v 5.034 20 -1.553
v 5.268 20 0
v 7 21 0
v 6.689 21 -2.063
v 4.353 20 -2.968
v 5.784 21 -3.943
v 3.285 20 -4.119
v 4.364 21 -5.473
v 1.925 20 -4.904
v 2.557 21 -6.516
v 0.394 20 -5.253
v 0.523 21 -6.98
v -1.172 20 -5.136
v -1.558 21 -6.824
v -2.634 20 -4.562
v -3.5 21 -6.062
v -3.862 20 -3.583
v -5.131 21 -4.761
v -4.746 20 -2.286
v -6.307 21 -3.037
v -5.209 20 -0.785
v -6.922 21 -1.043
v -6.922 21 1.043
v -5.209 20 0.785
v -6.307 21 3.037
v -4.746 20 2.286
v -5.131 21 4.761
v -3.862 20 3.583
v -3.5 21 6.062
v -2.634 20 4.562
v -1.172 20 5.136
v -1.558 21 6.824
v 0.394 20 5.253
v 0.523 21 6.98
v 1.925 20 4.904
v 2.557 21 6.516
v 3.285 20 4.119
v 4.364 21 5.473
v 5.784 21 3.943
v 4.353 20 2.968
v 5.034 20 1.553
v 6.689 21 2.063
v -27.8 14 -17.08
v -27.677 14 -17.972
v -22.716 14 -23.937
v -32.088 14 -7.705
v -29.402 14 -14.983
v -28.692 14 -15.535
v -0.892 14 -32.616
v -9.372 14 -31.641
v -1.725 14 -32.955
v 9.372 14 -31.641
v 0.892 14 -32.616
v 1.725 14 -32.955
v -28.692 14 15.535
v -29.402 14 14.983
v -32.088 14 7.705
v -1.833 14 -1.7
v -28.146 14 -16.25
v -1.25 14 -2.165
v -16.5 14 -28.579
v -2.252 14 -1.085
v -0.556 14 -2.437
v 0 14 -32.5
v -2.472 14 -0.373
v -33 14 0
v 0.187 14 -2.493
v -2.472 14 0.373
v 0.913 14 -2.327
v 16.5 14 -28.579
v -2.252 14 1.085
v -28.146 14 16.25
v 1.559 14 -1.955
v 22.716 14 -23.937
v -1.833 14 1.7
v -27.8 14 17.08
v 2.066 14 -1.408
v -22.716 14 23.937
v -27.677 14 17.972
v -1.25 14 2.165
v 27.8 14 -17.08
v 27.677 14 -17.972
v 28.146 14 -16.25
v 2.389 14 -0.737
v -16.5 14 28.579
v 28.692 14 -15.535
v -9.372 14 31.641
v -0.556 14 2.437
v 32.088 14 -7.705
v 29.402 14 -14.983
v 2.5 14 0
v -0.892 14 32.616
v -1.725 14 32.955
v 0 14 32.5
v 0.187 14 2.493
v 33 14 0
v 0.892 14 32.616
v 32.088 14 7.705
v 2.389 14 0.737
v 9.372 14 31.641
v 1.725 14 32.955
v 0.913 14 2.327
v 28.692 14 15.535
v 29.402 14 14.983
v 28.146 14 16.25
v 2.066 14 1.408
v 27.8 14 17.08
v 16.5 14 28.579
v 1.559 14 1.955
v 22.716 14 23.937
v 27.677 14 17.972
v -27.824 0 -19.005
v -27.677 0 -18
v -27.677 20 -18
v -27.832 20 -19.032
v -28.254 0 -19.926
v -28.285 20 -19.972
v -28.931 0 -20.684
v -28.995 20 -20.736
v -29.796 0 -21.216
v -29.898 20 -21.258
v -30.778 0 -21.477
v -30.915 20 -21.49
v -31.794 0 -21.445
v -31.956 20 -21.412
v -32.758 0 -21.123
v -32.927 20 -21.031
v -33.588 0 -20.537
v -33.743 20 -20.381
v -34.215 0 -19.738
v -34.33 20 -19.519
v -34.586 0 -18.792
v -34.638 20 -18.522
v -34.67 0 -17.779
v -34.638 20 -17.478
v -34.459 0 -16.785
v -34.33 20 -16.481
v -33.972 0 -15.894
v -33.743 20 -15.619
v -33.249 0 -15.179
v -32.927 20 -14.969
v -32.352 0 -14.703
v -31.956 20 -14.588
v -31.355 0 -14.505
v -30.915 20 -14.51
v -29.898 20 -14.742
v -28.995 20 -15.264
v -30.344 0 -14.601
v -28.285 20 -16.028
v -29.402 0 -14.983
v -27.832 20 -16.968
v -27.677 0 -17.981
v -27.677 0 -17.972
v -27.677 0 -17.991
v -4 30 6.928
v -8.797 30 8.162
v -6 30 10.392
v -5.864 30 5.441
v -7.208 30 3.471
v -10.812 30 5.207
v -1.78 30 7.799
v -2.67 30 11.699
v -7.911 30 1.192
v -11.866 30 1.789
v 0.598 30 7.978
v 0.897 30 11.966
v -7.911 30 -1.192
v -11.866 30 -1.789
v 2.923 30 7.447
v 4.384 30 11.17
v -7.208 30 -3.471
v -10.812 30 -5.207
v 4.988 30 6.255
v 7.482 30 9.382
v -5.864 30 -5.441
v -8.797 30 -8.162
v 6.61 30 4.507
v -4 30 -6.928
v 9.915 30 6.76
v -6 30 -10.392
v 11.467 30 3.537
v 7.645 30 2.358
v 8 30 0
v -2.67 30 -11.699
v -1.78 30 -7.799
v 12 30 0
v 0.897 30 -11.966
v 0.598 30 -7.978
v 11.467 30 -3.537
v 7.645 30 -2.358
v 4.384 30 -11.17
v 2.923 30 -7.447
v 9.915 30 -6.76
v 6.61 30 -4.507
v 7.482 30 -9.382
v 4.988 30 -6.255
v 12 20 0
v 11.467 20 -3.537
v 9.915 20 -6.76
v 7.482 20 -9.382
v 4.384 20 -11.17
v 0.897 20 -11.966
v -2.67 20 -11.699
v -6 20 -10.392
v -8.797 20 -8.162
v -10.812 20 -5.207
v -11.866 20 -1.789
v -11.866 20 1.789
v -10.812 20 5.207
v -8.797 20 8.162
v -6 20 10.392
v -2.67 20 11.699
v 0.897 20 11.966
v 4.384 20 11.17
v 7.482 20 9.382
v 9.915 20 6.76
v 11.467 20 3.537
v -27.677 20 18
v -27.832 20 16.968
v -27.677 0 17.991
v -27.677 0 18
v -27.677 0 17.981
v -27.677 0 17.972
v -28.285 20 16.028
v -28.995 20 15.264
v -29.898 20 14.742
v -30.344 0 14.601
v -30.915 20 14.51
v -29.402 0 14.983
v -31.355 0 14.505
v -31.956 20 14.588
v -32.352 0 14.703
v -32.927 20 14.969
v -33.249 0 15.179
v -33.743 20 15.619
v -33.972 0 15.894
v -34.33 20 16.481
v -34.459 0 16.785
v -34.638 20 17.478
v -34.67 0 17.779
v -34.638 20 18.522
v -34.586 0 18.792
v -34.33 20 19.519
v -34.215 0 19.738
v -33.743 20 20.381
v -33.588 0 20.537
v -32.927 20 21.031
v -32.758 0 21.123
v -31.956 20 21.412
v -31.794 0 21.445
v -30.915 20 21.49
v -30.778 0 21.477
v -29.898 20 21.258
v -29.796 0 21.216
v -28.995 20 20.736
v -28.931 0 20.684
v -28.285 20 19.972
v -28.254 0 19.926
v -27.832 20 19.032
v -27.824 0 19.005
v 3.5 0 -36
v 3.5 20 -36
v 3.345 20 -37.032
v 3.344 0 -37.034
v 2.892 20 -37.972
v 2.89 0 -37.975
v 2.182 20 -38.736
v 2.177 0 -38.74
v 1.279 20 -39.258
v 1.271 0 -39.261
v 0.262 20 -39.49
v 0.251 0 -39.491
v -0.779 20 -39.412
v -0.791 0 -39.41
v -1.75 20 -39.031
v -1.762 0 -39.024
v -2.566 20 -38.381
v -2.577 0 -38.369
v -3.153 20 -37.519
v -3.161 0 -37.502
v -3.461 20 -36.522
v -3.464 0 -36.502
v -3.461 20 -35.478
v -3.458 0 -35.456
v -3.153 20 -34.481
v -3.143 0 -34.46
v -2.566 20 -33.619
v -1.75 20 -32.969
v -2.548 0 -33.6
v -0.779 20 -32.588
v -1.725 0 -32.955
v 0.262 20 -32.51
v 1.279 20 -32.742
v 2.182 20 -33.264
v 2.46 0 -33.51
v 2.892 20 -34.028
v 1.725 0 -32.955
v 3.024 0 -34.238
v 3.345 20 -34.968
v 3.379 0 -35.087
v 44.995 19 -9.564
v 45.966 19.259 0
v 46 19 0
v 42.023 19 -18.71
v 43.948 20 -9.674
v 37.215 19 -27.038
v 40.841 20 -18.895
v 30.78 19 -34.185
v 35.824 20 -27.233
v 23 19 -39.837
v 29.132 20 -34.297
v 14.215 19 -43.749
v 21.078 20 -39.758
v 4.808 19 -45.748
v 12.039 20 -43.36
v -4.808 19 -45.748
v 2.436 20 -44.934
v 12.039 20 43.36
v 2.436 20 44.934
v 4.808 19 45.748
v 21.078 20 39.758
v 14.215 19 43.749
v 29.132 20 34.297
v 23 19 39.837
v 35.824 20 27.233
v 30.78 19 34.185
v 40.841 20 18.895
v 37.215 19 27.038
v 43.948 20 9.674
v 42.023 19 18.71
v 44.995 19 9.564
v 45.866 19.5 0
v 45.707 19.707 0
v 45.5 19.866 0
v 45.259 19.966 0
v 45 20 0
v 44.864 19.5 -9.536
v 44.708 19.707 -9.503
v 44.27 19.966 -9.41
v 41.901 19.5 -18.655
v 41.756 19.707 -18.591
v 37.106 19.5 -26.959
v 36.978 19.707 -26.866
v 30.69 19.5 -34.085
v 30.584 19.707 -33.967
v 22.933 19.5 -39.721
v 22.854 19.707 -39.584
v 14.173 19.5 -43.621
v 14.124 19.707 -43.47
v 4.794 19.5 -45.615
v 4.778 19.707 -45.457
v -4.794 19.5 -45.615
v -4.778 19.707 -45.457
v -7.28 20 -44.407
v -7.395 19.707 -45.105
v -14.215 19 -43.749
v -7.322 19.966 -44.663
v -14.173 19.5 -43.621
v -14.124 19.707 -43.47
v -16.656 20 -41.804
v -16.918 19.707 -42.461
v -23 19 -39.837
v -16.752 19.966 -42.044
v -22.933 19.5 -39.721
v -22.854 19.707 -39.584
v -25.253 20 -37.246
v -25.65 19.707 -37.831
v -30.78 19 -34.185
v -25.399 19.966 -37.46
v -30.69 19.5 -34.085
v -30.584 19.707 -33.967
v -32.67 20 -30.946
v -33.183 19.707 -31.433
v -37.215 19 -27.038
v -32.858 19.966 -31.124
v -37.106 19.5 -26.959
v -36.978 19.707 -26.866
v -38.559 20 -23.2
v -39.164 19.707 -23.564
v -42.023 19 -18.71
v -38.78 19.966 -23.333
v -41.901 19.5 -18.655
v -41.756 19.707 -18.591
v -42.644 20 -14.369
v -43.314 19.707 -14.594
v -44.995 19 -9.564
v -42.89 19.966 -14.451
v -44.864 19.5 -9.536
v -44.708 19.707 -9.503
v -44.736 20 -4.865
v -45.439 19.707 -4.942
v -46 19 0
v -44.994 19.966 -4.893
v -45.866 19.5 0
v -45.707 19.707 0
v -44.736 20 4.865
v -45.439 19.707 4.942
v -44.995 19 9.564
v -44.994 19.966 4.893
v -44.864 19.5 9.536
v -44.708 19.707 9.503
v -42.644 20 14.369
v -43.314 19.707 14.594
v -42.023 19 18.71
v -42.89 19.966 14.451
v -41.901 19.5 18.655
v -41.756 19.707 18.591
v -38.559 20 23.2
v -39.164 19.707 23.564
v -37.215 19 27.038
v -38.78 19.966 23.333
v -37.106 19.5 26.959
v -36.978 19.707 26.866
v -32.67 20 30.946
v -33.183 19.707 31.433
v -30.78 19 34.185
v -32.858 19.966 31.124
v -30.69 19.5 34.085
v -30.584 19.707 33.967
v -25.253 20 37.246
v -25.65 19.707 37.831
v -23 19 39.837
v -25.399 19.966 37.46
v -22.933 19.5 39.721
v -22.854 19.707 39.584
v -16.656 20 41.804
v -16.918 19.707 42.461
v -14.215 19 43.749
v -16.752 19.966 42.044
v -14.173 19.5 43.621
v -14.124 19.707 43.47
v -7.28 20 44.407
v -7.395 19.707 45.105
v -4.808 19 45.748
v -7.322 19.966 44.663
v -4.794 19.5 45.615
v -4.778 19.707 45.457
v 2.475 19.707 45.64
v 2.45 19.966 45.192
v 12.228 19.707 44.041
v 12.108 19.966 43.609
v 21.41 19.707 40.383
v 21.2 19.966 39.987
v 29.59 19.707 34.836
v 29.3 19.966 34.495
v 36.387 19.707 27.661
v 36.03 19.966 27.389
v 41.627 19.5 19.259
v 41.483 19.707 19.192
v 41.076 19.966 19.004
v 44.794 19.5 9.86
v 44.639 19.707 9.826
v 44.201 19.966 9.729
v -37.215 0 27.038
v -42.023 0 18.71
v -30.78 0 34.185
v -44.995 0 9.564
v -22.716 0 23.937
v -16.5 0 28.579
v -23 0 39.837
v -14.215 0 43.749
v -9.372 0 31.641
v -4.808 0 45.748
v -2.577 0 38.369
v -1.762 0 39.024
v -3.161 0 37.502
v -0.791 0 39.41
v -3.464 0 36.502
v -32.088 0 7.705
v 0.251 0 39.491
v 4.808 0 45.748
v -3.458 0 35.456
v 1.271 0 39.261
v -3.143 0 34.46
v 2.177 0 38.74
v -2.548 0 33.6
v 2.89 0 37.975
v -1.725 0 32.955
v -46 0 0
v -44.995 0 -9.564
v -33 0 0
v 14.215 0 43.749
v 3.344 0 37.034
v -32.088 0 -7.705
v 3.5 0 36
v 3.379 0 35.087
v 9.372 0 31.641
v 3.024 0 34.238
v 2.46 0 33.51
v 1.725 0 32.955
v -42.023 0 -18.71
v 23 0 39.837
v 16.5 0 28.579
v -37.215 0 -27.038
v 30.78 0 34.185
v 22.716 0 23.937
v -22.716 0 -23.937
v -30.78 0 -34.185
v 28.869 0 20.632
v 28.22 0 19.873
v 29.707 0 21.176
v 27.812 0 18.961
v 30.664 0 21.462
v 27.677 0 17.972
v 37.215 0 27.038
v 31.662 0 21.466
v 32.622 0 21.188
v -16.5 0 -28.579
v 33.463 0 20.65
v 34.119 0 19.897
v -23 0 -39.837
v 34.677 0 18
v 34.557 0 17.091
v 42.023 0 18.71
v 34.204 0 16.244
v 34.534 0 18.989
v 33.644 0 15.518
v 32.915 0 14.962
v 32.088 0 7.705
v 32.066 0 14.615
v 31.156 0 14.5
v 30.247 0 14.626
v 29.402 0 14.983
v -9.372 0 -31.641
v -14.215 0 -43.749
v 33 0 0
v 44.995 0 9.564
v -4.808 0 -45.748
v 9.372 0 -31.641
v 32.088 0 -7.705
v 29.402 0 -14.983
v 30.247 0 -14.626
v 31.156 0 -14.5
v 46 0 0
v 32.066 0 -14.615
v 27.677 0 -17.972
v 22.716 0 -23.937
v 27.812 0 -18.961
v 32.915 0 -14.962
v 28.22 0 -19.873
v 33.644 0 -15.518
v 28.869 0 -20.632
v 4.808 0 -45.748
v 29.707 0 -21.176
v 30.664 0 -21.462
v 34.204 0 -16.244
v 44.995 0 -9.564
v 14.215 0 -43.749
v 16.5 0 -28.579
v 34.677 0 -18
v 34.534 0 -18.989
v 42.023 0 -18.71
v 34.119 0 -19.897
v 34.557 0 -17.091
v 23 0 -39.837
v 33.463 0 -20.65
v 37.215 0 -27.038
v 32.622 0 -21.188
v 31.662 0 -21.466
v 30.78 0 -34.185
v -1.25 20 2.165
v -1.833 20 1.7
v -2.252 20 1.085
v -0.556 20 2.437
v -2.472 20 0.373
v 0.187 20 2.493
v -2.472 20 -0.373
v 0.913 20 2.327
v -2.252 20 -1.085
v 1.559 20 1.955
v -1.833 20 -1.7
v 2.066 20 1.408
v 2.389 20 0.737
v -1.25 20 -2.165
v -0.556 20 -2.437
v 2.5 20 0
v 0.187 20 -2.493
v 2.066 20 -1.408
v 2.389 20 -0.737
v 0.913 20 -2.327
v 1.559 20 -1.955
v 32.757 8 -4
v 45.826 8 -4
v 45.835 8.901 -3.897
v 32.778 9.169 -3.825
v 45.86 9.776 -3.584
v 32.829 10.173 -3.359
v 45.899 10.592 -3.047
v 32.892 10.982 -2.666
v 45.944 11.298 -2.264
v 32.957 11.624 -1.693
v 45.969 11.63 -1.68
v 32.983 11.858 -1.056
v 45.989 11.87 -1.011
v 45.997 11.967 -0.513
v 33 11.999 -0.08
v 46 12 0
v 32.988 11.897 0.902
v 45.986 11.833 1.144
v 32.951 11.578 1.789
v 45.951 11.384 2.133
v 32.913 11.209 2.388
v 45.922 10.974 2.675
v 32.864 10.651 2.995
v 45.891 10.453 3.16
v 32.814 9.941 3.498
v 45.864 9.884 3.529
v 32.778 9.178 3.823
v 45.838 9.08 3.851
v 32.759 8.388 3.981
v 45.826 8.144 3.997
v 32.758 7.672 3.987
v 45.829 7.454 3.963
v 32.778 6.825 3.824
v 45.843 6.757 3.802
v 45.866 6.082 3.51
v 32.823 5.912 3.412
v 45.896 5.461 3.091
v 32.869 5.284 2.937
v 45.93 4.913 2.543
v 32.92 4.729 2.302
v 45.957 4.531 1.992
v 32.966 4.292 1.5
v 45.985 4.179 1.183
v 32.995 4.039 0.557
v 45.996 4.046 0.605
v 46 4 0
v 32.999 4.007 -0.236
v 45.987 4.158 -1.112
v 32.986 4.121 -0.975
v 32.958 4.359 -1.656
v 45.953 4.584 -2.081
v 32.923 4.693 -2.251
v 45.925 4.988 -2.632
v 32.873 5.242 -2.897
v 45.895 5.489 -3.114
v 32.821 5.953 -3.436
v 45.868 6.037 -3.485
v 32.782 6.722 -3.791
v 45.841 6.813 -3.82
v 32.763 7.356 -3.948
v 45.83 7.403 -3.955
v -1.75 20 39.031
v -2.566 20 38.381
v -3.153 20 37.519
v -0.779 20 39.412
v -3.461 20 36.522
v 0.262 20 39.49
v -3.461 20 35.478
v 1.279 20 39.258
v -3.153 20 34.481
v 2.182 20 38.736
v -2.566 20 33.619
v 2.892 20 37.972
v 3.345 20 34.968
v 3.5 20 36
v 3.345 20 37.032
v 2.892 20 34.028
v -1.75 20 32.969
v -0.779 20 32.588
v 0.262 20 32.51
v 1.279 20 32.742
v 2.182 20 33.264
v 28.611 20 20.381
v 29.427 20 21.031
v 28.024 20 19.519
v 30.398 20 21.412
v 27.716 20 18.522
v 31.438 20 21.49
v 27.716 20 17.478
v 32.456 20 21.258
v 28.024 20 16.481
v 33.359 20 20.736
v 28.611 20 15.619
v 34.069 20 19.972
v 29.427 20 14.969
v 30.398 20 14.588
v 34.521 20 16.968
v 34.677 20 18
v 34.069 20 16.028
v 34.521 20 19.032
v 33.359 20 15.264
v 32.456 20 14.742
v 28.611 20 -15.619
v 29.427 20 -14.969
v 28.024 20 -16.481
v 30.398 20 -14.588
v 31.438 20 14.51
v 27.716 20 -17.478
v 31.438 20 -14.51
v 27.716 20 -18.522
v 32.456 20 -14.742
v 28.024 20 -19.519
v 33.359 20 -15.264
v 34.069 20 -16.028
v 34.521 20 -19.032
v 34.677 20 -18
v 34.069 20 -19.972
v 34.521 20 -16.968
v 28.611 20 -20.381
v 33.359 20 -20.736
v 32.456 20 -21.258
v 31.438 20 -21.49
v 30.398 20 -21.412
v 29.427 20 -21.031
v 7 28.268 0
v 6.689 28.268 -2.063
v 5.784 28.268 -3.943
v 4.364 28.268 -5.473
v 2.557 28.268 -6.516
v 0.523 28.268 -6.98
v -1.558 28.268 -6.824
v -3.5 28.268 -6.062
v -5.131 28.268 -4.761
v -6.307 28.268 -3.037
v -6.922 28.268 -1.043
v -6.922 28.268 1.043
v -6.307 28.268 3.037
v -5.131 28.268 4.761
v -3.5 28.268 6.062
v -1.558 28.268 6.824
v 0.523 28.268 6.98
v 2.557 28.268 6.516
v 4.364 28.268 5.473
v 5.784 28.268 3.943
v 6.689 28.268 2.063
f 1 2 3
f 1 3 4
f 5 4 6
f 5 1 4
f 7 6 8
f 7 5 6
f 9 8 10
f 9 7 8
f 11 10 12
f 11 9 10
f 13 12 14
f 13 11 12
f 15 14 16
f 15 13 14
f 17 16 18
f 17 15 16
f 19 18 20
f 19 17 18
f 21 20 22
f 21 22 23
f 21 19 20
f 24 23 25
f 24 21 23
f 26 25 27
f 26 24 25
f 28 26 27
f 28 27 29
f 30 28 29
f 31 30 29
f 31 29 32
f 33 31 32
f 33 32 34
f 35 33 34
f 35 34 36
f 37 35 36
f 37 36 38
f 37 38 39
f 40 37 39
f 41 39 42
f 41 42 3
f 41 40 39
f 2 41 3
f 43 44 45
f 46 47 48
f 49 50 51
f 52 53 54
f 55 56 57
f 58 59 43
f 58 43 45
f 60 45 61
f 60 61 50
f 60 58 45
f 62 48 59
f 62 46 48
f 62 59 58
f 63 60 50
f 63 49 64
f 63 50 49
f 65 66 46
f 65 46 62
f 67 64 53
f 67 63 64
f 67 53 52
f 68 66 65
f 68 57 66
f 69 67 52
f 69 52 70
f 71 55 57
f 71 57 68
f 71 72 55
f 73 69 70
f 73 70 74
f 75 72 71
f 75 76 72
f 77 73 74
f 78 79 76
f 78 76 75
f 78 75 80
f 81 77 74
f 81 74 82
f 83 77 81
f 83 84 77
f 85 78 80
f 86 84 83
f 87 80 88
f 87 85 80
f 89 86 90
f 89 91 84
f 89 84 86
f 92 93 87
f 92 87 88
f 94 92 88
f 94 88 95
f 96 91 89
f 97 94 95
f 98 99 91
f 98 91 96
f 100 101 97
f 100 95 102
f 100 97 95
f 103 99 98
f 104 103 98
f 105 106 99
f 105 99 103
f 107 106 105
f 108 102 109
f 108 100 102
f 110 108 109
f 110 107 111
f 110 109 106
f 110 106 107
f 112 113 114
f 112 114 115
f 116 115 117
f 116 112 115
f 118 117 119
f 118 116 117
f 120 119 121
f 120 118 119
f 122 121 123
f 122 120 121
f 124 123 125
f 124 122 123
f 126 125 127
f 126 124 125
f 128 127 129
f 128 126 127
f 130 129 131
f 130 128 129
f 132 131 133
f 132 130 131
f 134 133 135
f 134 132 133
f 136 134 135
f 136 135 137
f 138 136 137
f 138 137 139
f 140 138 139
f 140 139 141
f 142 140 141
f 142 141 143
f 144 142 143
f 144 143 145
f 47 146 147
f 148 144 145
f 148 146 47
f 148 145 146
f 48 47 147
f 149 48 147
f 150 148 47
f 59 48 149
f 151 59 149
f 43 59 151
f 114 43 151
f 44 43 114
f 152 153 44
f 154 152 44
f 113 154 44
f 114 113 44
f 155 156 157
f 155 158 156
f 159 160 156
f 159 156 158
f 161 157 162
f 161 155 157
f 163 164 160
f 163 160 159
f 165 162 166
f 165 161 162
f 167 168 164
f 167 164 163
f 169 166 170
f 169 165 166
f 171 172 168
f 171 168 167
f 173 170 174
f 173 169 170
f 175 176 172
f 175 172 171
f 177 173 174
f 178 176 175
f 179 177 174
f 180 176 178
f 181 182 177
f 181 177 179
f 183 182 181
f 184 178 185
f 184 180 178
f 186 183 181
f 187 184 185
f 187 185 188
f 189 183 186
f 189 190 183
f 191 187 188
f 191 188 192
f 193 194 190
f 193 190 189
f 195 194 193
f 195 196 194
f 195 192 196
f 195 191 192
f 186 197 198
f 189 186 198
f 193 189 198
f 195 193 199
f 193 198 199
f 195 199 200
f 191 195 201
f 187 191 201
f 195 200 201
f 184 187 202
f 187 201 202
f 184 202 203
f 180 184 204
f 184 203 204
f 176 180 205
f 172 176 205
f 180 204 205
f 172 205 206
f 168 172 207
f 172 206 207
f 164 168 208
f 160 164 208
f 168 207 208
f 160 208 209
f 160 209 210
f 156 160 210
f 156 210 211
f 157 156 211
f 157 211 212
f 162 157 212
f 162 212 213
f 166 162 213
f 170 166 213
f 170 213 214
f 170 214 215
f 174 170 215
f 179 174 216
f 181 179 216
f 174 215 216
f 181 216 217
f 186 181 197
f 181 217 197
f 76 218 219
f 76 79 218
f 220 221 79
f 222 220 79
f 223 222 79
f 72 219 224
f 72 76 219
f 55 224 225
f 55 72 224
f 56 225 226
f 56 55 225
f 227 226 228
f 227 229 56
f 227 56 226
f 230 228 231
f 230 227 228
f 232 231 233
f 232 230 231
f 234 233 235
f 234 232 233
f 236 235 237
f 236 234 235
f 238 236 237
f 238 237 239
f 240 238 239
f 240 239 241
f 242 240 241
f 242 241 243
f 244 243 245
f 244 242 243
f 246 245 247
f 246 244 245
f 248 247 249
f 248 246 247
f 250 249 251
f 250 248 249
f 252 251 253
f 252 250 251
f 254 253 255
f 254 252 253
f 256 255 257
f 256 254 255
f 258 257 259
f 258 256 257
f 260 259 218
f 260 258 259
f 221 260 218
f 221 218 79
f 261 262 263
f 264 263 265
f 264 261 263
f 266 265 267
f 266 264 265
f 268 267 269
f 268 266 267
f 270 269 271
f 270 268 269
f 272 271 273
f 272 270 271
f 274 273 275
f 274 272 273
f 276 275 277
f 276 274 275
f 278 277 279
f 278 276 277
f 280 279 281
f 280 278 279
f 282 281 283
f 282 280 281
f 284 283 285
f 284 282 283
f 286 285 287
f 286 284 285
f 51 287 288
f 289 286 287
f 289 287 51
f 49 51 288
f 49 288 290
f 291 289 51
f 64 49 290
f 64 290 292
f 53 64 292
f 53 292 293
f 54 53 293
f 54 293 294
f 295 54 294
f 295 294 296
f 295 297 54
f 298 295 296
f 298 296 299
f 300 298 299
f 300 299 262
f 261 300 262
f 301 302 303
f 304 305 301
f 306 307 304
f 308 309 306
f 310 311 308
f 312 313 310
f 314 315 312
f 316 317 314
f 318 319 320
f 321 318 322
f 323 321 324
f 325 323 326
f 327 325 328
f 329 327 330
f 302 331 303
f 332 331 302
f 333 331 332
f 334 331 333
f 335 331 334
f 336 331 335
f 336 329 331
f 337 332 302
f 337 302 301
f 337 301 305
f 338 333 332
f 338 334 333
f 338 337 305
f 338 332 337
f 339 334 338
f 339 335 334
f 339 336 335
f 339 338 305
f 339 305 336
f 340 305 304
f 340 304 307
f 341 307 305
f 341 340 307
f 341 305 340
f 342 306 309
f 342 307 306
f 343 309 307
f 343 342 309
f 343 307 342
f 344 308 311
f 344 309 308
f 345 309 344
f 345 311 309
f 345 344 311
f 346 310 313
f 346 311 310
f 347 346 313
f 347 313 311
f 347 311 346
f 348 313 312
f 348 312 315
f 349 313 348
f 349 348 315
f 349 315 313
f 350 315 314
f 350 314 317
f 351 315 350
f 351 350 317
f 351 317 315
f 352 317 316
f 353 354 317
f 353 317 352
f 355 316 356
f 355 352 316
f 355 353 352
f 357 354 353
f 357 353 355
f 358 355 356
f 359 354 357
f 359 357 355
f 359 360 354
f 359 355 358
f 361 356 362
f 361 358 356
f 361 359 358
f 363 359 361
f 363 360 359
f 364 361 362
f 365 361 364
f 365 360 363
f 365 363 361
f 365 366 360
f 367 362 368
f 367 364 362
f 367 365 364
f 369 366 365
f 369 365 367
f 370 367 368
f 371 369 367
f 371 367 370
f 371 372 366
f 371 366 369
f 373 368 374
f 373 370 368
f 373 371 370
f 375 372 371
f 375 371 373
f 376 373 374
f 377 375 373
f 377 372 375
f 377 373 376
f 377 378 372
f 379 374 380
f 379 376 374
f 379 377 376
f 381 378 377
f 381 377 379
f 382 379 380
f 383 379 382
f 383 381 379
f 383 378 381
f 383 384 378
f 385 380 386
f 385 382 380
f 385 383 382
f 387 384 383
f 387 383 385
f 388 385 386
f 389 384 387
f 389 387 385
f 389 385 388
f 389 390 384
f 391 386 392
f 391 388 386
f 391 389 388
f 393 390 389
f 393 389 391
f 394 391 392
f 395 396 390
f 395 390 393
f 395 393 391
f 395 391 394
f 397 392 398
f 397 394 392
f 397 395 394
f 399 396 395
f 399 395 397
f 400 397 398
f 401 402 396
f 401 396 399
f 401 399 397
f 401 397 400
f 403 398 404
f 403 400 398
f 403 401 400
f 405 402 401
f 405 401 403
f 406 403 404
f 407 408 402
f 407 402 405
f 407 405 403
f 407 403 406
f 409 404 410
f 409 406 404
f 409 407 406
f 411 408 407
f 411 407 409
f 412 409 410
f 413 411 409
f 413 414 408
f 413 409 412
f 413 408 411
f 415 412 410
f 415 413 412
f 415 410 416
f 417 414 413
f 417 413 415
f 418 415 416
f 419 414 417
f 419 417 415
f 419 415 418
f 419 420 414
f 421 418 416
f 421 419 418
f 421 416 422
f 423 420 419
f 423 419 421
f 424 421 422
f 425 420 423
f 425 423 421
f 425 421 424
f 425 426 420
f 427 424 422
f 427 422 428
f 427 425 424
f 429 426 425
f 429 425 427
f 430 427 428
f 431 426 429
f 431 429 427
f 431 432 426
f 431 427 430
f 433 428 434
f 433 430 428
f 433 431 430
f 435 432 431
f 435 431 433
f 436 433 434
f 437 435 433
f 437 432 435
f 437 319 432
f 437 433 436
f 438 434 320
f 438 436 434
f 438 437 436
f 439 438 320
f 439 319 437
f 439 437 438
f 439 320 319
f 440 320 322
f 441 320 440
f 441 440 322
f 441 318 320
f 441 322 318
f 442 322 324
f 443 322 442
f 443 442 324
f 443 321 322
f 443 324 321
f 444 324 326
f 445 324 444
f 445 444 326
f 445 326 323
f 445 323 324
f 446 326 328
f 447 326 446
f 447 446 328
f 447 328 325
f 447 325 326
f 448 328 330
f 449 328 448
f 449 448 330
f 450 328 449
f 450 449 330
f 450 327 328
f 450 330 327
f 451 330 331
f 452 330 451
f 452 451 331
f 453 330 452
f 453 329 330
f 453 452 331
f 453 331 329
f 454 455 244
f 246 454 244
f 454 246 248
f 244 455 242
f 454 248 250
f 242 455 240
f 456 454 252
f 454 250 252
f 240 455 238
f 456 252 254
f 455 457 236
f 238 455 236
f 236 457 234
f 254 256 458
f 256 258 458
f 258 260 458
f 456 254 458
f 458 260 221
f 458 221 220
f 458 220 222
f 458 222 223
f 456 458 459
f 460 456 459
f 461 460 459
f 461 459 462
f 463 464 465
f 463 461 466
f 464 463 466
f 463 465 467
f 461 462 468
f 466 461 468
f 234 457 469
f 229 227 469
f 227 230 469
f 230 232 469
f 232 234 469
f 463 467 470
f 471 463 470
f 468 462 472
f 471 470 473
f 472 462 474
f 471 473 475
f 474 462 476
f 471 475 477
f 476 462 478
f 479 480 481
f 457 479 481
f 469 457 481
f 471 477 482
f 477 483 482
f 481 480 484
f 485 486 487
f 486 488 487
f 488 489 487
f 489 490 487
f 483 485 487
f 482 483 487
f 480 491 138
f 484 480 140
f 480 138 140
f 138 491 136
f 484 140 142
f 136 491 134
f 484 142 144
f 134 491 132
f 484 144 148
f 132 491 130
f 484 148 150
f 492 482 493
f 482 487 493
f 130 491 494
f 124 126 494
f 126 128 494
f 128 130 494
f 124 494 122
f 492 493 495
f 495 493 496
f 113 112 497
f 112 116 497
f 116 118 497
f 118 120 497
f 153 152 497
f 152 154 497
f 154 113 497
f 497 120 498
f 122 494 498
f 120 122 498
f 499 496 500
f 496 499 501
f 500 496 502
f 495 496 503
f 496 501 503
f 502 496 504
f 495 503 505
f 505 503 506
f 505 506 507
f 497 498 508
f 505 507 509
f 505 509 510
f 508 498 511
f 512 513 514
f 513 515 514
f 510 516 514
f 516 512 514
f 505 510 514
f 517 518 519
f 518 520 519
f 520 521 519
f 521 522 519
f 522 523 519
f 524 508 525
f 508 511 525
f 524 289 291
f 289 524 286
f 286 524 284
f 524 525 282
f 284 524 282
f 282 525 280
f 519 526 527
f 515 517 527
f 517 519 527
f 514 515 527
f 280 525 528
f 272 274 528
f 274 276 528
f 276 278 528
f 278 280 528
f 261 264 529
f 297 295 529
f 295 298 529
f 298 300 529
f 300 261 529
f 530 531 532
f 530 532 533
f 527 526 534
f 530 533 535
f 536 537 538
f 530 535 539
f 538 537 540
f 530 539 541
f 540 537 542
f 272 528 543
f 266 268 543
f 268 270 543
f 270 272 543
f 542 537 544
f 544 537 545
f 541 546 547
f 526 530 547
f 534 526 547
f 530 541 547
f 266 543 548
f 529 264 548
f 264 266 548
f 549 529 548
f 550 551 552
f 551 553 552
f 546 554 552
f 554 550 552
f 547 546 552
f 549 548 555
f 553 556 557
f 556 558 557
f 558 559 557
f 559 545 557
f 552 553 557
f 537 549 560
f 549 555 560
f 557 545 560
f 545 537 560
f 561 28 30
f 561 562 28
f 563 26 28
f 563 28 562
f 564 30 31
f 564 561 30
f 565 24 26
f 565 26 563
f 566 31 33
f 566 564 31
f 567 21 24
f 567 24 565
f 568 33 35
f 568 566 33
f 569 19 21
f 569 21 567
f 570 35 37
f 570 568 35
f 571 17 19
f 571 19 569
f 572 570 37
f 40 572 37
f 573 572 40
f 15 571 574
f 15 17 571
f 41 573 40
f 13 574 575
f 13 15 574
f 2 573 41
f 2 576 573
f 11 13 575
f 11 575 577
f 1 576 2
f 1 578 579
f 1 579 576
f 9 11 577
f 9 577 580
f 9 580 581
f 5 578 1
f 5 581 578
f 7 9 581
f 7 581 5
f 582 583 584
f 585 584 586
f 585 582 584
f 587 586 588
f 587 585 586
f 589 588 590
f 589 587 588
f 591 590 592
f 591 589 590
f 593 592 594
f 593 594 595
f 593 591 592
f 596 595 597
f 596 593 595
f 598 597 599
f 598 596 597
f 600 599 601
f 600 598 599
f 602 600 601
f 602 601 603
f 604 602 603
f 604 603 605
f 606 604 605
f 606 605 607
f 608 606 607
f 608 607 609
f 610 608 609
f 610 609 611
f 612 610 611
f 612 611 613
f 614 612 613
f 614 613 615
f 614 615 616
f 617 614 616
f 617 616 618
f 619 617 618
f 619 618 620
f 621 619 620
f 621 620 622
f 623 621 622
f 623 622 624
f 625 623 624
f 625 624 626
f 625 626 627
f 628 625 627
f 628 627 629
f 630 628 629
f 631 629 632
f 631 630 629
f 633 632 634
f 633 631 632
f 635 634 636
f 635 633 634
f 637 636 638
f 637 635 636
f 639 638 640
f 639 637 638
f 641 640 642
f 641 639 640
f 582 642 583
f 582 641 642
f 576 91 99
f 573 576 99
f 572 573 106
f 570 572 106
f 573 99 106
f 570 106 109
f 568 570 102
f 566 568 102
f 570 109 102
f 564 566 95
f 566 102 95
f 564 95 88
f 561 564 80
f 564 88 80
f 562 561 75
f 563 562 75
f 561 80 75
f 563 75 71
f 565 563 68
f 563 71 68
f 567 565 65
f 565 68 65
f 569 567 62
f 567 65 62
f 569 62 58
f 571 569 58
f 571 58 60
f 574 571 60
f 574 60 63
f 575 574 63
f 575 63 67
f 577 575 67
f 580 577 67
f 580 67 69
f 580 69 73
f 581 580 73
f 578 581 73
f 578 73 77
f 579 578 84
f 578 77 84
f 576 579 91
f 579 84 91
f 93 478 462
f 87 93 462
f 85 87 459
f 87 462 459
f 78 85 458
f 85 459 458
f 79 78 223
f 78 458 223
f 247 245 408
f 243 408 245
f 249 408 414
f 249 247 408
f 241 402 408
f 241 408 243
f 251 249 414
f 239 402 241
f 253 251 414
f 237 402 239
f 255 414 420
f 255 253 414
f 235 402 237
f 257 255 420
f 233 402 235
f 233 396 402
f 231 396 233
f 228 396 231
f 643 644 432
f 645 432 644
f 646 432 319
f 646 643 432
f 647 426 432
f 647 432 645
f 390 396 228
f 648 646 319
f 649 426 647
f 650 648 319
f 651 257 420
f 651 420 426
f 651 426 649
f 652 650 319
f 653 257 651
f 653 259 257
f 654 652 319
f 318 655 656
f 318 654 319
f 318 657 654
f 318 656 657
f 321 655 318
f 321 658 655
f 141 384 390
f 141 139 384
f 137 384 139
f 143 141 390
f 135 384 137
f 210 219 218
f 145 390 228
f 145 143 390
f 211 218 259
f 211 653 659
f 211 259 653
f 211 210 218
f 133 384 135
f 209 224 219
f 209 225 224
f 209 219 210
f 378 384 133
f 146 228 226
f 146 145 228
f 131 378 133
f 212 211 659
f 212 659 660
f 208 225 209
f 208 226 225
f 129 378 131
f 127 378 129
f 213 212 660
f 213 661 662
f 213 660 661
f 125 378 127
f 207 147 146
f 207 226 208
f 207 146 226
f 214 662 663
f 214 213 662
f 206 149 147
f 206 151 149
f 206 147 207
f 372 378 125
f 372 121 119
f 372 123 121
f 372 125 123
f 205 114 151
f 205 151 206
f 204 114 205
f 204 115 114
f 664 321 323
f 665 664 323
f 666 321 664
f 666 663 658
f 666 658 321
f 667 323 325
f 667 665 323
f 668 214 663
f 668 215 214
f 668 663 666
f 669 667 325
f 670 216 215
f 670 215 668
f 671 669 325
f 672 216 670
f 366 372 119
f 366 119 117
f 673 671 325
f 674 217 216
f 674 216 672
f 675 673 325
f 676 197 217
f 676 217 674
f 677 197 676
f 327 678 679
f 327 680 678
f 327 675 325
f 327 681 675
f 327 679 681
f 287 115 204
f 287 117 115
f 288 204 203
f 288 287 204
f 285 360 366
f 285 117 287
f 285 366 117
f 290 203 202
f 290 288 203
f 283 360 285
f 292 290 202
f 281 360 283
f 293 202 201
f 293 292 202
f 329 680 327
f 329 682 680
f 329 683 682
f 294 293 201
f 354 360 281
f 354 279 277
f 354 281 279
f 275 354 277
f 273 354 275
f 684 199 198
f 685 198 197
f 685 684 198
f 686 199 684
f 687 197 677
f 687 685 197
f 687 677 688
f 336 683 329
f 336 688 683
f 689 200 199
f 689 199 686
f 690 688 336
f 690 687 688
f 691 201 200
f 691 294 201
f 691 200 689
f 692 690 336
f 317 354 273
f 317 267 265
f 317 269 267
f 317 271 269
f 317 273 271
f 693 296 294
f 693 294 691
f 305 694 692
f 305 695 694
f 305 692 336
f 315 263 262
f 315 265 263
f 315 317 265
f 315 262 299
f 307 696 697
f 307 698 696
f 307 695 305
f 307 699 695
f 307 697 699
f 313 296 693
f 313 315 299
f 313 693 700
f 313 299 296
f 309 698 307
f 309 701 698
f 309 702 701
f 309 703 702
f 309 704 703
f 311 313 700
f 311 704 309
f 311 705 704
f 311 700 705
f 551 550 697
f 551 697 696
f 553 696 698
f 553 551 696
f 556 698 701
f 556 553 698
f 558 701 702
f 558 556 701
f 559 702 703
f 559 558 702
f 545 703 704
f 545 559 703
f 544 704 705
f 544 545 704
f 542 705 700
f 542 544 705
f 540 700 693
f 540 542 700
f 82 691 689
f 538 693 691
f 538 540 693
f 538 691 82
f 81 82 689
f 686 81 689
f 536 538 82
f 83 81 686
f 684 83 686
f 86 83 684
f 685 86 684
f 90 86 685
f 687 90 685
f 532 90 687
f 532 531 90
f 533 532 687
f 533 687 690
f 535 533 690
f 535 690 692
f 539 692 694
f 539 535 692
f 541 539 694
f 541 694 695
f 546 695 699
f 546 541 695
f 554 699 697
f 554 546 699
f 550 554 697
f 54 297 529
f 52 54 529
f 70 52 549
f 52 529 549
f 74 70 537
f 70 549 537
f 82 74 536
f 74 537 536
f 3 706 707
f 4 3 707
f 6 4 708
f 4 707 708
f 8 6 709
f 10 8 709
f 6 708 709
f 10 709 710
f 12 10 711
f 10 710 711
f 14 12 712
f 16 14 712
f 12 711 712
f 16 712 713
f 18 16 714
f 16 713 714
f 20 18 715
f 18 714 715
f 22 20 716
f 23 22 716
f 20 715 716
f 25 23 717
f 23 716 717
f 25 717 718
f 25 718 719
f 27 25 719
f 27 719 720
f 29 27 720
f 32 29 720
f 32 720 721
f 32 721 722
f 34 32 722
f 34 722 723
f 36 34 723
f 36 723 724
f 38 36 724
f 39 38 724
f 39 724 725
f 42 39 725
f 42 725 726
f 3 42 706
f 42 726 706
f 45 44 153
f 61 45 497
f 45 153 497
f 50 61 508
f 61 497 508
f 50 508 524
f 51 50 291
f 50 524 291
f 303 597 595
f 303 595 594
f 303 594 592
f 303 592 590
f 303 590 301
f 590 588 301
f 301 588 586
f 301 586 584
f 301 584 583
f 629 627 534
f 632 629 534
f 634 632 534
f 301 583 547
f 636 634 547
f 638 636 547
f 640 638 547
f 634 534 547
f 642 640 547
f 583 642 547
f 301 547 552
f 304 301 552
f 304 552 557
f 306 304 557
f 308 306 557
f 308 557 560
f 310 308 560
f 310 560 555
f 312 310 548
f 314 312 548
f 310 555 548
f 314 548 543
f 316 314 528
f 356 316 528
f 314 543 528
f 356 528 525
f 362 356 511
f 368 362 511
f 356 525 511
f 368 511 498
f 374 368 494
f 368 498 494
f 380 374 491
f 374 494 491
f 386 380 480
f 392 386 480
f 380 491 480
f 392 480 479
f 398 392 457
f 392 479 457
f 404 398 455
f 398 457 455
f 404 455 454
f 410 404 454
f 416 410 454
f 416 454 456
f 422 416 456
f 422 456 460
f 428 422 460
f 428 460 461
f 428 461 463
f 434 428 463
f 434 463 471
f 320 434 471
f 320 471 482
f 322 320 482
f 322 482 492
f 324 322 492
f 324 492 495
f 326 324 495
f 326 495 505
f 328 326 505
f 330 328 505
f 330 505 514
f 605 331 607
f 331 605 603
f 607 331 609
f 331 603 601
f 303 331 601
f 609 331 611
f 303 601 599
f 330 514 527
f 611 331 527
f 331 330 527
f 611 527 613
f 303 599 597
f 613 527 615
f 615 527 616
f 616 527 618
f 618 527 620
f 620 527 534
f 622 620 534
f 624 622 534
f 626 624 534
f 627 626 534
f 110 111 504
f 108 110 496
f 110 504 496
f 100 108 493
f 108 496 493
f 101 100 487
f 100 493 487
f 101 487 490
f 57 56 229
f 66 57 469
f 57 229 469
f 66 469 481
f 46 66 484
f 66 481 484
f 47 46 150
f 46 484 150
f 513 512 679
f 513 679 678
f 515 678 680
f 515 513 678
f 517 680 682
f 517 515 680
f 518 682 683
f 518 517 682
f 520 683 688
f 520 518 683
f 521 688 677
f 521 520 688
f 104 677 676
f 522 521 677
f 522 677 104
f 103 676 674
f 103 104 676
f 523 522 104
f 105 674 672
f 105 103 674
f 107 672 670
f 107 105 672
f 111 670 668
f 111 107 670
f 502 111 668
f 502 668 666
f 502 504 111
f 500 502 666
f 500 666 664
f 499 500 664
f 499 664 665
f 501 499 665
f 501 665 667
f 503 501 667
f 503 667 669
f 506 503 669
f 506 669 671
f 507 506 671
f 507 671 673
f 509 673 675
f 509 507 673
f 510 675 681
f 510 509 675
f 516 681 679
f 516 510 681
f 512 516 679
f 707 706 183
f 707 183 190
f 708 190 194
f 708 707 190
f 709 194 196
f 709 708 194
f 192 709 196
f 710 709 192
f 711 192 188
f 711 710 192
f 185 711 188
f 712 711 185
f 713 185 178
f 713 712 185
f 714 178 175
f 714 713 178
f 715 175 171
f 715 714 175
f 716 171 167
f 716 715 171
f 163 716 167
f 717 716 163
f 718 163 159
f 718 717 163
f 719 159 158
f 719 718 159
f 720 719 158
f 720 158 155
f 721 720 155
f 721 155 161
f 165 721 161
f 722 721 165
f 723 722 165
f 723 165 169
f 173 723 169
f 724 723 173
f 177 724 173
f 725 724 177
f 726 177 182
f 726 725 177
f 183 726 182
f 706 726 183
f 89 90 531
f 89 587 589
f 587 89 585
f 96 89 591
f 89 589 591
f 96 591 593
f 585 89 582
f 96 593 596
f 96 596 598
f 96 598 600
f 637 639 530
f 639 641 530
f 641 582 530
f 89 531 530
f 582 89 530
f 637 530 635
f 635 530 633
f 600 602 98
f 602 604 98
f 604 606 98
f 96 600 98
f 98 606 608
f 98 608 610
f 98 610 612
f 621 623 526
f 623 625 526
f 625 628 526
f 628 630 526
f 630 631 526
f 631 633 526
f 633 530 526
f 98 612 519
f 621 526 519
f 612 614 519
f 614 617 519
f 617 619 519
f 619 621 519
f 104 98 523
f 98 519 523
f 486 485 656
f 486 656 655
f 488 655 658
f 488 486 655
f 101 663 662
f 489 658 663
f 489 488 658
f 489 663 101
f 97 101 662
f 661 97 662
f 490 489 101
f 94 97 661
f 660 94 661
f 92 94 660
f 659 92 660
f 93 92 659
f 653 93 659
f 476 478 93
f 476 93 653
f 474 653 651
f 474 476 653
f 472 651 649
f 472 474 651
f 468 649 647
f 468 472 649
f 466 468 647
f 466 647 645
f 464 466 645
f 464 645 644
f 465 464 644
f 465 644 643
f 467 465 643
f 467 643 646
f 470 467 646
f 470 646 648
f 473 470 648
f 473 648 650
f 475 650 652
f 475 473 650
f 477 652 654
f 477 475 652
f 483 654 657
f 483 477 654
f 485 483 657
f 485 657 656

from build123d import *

# Parameters (mm, degrees)
SKETCH3_R             = 46
SKETCH3_R_2           = 3.5
BOSS_EXTRUDE2_DEPTH   = 20
FILLET1_R             = 1
SKETCH4_R             = 12
BOSS_EXTRUDE3_DEPTH   = 10
SKETCH5_R             = 33
CUT_EXTRUDE1_DEPTH    = 14
SKETCH6_R             = 2.5
CUT_EXTRUDE2_DEPTH    = 6
SKETCH7_R             = 7
CUT_EXTRUDE3_DEPTH    = 10
CHAMFER1_SIZE         = 1
CHAMFER1_SIZE2        = 1.732050808
CHAMFER1_PART_2_SIZE  = 1
CHAMFER1_PART_2_SIZE2 = 1.732050808
SKETCH8_R             = 4
CUT_EXTRUDE4_DEPTH    = 47.0000001


with BuildPart() as part:
    # Sketch3 → Boss-Extrude2 (new body)
    with BuildSketch(Plane(origin=(0, 0, 0), x_dir=(1, 0, 0), z_dir=(0, 1, 0))):
        Circle(SKETCH3_R)
        with Locations((0, 36)):
            Circle(SKETCH3_R_2, mode=Mode.SUBTRACT)
        with Locations((31.176914536, 18)):
            Circle(SKETCH3_R_2, mode=Mode.SUBTRACT)
        with Locations((31.176914536, -18)):
            Circle(SKETCH3_R_2, mode=Mode.SUBTRACT)
        with Locations((0, -36)):
            Circle(SKETCH3_R_2, mode=Mode.SUBTRACT)
        with Locations((-31.176914536, -18)):
            Circle(SKETCH3_R_2, mode=Mode.SUBTRACT)
        with Locations((-31.176914536, 18)):
            Circle(SKETCH3_R_2, mode=Mode.SUBTRACT)
    extrude(amount=BOSS_EXTRUDE2_DEPTH)

    # Fillet1
    fillet1_edges = [part.edges().sort_by_distance(p)[0] for p in [
        (-46, 20, 0),
    ]]
    fillet(fillet1_edges, radius=FILLET1_R)

    # Sketch4 → Boss-Extrude3 (add)
    with BuildSketch(Plane(origin=(0, 20, 0), x_dir=(1, 0, 0), z_dir=(0, 1, 0))):
        Circle(SKETCH4_R)
    extrude(amount=BOSS_EXTRUDE3_DEPTH)

    # Sketch5 → Cut-Extrude1 (cut)
    with BuildSketch(Plane.XZ):
        Circle(SKETCH5_R)
    extrude(amount=-CUT_EXTRUDE1_DEPTH, mode=Mode.SUBTRACT)

    # Sketch6 → Cut-Extrude2 (cut)
    with BuildSketch(Plane.XZ.offset(-14)):
        Circle(SKETCH6_R)
    extrude(amount=-CUT_EXTRUDE2_DEPTH, mode=Mode.SUBTRACT)

    # Sketch7 → Cut-Extrude3 (cut)
    with BuildSketch(Plane(origin=(0, 30, 0), x_dir=(1, 0, 0), z_dir=(0, 1, 0))):
        Circle(SKETCH7_R)
    extrude(amount=-CUT_EXTRUDE3_DEPTH, mode=Mode.SUBTRACT)

    # Chamfer1
    chamfer1_edges = [part.edges().sort_by_distance(p)[0] for p in [
        (-7, 20, 0),
    ]]
    chamfer1_side = [part.faces().sort_by_distance(p)[0] for p in [
        (-7, 25, 0),
    ]]
    chamfer(chamfer1_edges, length=CHAMFER1_SIZE, length2=CHAMFER1_SIZE2, reference=chamfer1_side[0])

    # Chamfer1 part 2
    chamfer1_part_2_edges = [part.edges().sort_by_distance(p)[0] for p in [
        (-7, 30, 0),
    ]]
    chamfer1_part_2_side = [part.faces().sort_by_distance(p)[0] for p in [
        (-11.660588745, 30, 0),
    ]]
    chamfer(chamfer1_part_2_edges, length=CHAMFER1_PART_2_SIZE, length2=CHAMFER1_PART_2_SIZE2, reference=chamfer1_part_2_side[0])

    # Sketch8 → Cut-Extrude4 (cut, through all)
    with BuildSketch(Plane(origin=(0, 0, 0), x_dir=(0, 0, -1), z_dir=(1, 0, 0))):
        with Locations((0, 8)):
            Circle(SKETCH8_R)
    extrude(amount=CUT_EXTRUDE4_DEPTH, mode=Mode.SUBTRACT)


solid = part.part
